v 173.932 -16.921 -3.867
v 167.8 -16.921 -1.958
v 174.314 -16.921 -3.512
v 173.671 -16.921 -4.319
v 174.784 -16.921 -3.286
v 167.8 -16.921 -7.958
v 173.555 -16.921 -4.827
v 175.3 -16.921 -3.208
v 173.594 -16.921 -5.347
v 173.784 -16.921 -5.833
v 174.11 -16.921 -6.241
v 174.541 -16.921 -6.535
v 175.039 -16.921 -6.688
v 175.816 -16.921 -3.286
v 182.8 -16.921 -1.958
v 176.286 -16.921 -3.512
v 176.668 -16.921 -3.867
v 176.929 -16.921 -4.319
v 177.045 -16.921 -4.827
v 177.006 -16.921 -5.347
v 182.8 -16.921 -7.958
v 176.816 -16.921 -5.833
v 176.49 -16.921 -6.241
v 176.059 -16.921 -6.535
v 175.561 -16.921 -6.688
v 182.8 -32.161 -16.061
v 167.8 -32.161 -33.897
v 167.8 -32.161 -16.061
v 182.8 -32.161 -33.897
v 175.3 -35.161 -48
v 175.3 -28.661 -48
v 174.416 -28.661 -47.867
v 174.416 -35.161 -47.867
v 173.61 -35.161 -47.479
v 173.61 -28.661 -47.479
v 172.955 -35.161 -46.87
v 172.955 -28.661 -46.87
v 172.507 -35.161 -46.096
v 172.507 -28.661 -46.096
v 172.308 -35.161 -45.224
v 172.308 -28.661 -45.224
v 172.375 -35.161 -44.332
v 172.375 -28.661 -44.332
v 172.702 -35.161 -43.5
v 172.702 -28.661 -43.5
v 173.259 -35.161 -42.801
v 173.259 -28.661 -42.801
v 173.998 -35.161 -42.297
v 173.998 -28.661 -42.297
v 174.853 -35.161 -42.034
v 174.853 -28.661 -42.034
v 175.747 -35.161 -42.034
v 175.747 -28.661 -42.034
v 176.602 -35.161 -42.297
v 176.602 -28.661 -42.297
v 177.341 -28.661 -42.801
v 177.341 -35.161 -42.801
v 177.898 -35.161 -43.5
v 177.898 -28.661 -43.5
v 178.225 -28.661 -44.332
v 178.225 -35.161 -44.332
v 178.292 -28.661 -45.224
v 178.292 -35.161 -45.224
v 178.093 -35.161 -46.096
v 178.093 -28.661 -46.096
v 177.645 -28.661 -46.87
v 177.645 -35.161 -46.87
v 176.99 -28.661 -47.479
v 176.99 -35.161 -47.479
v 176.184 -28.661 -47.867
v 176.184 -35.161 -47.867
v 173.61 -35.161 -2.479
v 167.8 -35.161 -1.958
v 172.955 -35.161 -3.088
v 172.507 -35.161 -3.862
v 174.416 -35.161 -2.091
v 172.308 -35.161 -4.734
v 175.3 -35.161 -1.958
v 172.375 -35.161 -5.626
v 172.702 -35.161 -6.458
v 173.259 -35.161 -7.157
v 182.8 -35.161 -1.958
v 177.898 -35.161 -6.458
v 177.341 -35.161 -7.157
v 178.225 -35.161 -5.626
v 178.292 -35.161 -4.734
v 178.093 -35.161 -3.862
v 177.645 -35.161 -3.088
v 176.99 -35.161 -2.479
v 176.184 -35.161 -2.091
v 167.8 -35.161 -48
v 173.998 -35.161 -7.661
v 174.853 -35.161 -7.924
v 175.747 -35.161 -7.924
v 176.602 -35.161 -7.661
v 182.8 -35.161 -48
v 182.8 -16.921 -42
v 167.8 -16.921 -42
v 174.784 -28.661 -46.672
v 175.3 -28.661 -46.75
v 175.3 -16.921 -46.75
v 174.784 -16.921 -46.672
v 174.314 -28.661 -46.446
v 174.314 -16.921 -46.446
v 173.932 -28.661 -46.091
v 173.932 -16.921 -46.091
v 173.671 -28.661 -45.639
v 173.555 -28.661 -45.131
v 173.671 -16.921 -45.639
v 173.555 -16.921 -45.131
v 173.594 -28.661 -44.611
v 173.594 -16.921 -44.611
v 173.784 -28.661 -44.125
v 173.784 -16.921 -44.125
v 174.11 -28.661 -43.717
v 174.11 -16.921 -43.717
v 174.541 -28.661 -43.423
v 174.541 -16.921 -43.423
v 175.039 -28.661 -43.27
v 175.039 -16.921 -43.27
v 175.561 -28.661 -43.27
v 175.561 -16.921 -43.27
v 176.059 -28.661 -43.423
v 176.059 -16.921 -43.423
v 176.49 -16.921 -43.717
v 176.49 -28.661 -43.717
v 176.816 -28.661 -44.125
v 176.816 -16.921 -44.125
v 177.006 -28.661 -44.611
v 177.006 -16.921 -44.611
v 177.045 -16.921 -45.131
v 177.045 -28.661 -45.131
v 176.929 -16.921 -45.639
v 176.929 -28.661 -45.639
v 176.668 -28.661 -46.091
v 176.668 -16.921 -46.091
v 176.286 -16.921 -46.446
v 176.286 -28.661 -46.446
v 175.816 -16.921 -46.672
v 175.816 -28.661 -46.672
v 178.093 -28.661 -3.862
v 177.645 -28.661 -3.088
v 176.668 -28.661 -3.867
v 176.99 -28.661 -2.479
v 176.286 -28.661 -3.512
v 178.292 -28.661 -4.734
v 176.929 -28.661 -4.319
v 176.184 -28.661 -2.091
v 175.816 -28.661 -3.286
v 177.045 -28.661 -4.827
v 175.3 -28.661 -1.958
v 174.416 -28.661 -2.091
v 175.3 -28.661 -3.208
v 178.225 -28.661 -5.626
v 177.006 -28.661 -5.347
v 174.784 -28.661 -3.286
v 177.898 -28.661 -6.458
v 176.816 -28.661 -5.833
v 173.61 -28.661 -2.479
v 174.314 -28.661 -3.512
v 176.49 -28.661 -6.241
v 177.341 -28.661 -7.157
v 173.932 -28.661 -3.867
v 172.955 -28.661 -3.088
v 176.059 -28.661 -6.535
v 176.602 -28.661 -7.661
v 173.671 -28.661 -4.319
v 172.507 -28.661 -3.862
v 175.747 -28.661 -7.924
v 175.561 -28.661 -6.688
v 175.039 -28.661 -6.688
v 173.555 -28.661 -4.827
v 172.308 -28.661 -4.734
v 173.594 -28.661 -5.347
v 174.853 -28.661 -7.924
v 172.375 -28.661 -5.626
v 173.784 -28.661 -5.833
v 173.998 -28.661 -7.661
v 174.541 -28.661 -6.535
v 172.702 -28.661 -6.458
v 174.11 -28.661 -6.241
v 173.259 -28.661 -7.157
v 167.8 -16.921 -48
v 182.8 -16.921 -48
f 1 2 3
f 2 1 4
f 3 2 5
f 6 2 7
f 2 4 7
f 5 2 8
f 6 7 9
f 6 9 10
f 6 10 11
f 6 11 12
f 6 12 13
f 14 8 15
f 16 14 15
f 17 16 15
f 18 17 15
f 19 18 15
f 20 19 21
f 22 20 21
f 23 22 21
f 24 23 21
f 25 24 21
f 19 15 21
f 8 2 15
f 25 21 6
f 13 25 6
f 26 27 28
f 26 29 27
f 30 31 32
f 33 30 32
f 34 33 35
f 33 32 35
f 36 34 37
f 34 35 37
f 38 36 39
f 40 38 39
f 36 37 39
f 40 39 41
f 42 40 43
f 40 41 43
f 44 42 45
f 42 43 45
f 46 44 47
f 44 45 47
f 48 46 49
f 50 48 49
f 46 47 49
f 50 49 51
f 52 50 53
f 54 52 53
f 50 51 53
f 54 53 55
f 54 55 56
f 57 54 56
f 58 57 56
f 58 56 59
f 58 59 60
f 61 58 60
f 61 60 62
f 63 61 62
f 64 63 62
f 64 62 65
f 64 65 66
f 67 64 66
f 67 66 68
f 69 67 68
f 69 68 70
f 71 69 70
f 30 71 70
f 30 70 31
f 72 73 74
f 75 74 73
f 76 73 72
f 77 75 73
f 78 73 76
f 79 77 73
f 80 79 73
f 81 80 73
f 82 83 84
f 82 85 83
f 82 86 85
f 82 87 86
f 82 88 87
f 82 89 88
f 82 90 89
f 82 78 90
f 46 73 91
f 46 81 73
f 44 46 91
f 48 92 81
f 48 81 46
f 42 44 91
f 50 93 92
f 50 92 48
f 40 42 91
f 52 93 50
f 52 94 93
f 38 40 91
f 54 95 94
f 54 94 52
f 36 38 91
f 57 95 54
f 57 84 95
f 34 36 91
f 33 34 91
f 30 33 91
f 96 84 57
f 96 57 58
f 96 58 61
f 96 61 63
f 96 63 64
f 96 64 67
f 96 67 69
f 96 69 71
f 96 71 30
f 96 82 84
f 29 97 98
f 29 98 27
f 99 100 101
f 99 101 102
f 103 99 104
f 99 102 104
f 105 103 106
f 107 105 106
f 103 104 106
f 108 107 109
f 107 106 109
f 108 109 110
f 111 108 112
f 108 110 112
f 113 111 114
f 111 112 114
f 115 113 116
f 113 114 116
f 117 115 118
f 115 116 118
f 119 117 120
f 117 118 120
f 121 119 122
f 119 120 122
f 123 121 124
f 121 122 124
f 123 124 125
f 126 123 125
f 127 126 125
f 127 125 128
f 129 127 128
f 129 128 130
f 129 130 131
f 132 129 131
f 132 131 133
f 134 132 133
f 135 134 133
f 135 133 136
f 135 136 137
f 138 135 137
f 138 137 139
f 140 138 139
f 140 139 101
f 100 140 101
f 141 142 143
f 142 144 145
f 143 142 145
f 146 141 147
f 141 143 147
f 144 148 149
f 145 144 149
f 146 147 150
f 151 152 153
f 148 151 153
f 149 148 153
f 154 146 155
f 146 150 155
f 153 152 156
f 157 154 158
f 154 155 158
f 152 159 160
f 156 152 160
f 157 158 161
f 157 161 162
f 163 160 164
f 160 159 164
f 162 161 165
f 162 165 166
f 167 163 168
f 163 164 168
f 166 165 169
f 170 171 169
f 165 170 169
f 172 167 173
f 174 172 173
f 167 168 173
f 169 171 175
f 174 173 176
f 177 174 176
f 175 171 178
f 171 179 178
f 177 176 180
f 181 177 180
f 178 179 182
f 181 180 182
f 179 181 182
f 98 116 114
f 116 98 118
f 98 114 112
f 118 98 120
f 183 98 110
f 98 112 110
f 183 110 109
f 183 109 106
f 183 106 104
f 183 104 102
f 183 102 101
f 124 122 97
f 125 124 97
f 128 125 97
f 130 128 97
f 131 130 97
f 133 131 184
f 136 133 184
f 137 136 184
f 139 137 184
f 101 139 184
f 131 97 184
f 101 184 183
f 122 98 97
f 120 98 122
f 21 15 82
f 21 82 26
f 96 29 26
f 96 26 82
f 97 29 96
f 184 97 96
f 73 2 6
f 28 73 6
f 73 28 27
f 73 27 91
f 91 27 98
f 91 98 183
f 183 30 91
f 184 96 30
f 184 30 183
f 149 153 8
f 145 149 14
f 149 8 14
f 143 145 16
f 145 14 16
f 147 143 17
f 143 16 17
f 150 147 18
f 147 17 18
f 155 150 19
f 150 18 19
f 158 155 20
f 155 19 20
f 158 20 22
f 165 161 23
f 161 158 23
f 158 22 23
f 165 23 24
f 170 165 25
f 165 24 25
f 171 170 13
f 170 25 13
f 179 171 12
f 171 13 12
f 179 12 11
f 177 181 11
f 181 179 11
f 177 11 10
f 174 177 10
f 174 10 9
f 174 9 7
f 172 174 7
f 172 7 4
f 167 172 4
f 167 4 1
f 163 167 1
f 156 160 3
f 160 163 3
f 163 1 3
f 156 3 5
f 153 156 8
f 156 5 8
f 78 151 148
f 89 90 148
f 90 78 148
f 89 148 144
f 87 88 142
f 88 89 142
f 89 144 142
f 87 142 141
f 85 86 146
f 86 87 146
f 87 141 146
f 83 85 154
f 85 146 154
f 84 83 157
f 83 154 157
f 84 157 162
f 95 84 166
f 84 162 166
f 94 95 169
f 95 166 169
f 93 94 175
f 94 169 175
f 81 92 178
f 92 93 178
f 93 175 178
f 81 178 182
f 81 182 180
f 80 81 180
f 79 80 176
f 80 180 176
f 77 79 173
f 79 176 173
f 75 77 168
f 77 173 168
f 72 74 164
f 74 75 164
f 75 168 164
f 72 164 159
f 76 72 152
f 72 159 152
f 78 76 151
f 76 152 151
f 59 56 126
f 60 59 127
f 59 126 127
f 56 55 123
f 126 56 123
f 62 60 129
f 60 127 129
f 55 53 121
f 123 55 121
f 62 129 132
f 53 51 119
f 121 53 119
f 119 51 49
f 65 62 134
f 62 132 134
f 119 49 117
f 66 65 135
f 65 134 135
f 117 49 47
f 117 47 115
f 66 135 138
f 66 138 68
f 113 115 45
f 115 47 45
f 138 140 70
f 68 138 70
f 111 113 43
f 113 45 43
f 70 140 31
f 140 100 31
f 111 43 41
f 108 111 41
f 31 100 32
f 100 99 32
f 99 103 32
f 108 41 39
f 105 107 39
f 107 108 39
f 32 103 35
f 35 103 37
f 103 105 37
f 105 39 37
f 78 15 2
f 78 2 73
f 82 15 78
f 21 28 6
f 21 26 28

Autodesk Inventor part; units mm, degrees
ref_plane "YZ Plane" through (0, 0, 0) normal (1, 0, 0) x (0, 1, 0)
ref_plane "XZ Plane" through (0, 0, 0) normal (0, 1, 0) x (-1, 0, 0)
ref_plane "Work Plane1" through (182.8, -16.921, -7.958) normal (0, -1, 0) x (0, 0, -1)
ref_plane "Work Plane2" through (182.8, -6.9868, -42.1222) normal (1, 0, 0) x (0, 0, -1)
sketch "Sketch1" plane through (182.8, -6.9868, -42.1222) normal (1, 0, 0) x (0, 0, -1)
  arc A0 (5.0194, 6.9868) -> (5.8778, 5.8182) centre (7.8778, 8.1868) ccw projected
  line L0 (-9.7772, 6.9868) -> (5.0194, 6.9868) projected
  arc A1 (-7.9865, 5.8774) -> (-9.7772, 6.9868) centre (-9.7772, 4.9868) ccw projected
  line L1 (-7.9865, 5.8774) -> (-0.1222, -9.9342) projected
  line L2 (-0.1222, -9.9342) -> (5.8778, -9.9342) projected
  line L3 (5.8778, -9.9342) -> (5.8778, 5.8182) projected
  line L4 (-42.1222, 6.9868) -> (-42.1222, -9.9342) projected
  line L5 (-42.1222, -9.9342) -> (-34.1642, -9.9342) projected
  line L6 (-34.1642, -9.9342) -> (-26.2998, 5.8774) projected
  arc A2 (-24.5091, 6.9868) -> (-26.2998, 5.8774) centre (-24.5091, 4.9868) ccw projected
  line L7 (-42.1222, 6.9868) -> (-24.5091, 6.9868) projected
  circle A3 centre (-17.1432, -9.9342) radius 15.24 construction
  line L8 (-17.1432, -9.9342) -> (-17.1432, -20.9232) construction
  line L9 (-17.1432, -9.9342) -> (-6.1542, -9.9342) construction
  line L10 (-0.1222, -9.9342) -> (-8.2255, -25.1742)
  line L11 (-0.1222, -9.9342) -> (17.1381, -9.9342) construction
  line L12 (-8.2255, -25.1742) -> (-17.1432, -25.1742)
  line L13 (-17.1432, -25.1742) -> (-17.1432, -28.1742)
  line L14 (-17.1432, -28.1742) -> (5.8778, -28.1742)
  line L15 (5.8778, -28.1742) -> (5.8778, -9.9342)
  line L16 (-0.1222, -9.9342) -> (5.8778, -9.9342)
  dimension "d0" = 90
  dimension "d1" = 118
  dimension "d2" = 3
  dimension "d3" = 90
ref_plane "Work Plane3" through (167.8, -16.921, -48) normal (-1, 0, 0) x (0, 0, 1)
extrude "Extrusion1" add sketch "Sketch1" against normal up to surface (15 mm away) contours L15 L14 L13 L12 L10 L2
sketch "Sketch2" plane through (182.8, -35.161, -48) normal (0, -1, 0) x (1, 0, 0)
  circle A0 centre (-7.5, 3) radius 1.45 projected
  point P0 (-182.8, 48)
hole "Hole1" at (175.3, -35.161, -45) direction (0, 1, 0) diameter 3.5 end through all counterbore diameter 6 counterbore depth 6.5
mirror "Mirror1" about plane through (182.8, -35.161, -24.979) normal (0, 0, 1) of "Extrusion1", "Hole1"
properties part number "30_CUBE_openSIM_Lensfixation"
